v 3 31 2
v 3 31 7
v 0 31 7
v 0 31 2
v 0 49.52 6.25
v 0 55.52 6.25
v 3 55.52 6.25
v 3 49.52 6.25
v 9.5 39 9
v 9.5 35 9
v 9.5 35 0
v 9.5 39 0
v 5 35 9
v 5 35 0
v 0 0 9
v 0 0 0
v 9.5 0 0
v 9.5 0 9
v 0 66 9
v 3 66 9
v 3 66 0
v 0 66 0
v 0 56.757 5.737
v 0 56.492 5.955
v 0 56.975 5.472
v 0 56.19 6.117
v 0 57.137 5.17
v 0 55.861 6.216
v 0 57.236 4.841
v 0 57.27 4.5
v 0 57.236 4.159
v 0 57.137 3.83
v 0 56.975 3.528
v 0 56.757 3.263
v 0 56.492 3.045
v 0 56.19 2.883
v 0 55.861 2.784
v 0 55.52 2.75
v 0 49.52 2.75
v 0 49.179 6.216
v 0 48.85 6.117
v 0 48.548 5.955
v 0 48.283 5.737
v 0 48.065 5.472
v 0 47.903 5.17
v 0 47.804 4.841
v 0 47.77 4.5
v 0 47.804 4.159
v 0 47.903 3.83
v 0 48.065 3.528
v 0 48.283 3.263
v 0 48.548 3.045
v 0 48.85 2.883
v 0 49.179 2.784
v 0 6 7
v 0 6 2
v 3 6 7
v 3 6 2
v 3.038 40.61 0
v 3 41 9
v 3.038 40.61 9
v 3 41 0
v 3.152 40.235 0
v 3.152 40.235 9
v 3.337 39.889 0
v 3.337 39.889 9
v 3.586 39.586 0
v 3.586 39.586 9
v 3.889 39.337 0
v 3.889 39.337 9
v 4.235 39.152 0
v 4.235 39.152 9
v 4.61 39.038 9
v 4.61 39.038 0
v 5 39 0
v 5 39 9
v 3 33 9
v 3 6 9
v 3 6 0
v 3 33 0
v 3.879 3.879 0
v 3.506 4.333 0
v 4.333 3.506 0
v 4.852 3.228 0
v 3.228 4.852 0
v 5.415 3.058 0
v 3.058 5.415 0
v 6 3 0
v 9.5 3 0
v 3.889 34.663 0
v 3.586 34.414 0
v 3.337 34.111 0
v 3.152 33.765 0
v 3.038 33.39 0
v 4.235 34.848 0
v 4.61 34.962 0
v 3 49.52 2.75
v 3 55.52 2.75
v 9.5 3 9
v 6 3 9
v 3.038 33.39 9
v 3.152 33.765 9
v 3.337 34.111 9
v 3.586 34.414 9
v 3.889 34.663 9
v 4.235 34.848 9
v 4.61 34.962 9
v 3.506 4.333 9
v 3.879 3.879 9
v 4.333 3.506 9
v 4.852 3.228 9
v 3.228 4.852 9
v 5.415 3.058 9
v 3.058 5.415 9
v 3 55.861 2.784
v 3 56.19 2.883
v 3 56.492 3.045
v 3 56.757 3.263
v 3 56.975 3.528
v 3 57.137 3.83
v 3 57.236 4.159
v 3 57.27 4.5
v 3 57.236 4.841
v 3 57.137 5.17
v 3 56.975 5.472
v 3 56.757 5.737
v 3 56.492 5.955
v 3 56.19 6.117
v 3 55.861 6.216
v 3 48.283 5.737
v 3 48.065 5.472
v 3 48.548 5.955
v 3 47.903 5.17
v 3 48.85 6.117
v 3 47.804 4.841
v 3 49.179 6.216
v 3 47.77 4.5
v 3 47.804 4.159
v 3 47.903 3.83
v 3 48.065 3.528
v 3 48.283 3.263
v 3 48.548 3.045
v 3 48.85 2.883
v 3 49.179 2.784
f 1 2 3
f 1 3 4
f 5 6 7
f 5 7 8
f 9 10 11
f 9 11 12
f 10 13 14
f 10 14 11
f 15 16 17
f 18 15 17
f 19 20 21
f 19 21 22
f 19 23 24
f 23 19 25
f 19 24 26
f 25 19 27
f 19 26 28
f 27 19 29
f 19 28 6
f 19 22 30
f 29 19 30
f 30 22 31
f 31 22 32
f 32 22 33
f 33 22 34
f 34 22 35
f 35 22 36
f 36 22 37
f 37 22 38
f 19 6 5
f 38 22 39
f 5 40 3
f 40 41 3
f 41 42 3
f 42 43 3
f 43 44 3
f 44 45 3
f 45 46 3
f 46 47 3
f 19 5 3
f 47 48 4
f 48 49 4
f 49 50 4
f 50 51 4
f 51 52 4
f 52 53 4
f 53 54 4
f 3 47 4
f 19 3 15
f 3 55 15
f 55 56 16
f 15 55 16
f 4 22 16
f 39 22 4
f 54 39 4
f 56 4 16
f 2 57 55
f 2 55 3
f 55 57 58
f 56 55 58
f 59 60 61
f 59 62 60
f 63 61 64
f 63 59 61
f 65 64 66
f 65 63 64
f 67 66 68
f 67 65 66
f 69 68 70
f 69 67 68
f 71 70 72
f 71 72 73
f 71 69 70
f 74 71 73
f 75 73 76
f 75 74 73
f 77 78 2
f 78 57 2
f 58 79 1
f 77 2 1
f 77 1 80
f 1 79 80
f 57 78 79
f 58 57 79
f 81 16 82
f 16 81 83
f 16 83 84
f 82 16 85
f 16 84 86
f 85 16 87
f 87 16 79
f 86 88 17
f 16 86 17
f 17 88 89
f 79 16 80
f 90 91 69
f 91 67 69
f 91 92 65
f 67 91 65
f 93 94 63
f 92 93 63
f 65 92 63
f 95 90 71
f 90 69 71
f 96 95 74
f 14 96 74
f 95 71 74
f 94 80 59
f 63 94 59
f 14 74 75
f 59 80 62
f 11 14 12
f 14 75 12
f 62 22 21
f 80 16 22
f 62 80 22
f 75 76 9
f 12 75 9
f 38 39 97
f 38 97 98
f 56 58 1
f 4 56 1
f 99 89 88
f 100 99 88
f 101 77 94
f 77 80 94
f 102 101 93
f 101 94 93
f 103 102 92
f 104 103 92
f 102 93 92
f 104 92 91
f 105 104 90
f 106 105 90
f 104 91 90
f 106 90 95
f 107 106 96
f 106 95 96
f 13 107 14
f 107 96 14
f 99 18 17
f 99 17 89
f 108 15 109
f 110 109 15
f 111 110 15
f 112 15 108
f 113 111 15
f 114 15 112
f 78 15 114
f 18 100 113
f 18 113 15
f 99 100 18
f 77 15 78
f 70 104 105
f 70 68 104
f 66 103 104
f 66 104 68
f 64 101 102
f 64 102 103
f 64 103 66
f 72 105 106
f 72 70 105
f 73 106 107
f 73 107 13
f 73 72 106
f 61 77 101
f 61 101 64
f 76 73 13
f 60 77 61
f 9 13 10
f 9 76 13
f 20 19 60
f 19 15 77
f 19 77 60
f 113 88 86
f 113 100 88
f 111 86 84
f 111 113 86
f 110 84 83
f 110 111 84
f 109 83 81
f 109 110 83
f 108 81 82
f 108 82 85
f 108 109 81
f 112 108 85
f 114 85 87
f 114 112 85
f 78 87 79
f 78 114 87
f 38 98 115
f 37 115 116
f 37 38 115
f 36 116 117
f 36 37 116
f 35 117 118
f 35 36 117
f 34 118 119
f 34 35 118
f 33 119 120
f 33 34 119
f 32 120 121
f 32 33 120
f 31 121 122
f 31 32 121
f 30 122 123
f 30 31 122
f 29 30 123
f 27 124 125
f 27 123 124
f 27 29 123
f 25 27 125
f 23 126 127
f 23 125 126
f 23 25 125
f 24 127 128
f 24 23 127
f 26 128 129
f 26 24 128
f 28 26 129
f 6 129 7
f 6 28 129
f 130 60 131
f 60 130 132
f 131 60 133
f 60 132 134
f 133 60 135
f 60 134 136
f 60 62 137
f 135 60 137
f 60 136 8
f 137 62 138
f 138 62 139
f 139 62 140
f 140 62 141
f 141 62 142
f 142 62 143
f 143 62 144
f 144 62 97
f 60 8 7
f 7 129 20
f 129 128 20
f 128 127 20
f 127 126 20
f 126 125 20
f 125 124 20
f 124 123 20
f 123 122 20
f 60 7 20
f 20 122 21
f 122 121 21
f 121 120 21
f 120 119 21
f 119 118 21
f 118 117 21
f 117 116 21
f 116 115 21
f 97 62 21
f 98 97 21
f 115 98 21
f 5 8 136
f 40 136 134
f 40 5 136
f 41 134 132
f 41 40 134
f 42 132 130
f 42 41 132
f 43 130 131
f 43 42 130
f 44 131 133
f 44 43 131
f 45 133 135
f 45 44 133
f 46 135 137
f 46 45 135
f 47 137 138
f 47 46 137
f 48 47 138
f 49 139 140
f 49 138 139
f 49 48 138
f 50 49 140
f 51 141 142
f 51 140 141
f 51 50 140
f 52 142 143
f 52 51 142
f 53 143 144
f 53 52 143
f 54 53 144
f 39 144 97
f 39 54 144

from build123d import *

# Parameters (mm, degrees)
EXTRUDE_1_DEPTH     = 9
CUT_EXTRUDE_2_DEPTH = 68.284842275
SKETCH_6_W          = 5
SKETCH_6_H          = 25
CUT_EXTRUDE_3_DEPTH = 67.927199254
FILLET_1_R          = 3
SKETCH_7_W          = 6.5
SKETCH_7_H          = 4
EXTRUDE_2_DEPTH     = 9
FILLET_2_R          = 2


with BuildPart() as part:
    # Эскиз1 → Бобышка-Вытянуть1 (new body)
    with BuildSketch(Plane.XY):
        Polygon((0, 0), (9.5, 0), (9.5, 3), (3, 3), (3, 66), (0, 66), align=None)
    extrude(amount=EXTRUDE_1_DEPTH)

    # Эскиз4 → Вырез-Вытянуть2 (cut, through all)
    with BuildSketch(Plane.ZY):
        with BuildLine():
            Line((6.25, 55.52), (6.25, 49.52))
            ThreePointArc((6.25, 49.52), (4.5, 47.77), (2.75, 49.52))
            Line((2.75, 49.52), (2.75, 55.52))
            ThreePointArc((2.75, 55.52), (4.5, 57.27), (6.25, 55.52))
        make_face()
    extrude(amount=-CUT_EXTRUDE_2_DEPTH, mode=Mode.SUBTRACT)

    # Эскиз6 → Вырез-Вытянуть3 (cut, through all)
    with BuildSketch(Plane(origin=(3, 0, 0), x_dir=(0, 0, -1), z_dir=(1, 0, 0))):
        with Locations((-4.5, 18.5)):
            Rectangle(SKETCH_6_W, SKETCH_6_H)
    extrude(amount=-CUT_EXTRUDE_3_DEPTH, mode=Mode.SUBTRACT)

    # Скругление1
    fillet_1_edges = [part.edges().sort_by_distance(p)[0] for p in [
        (3, 3, 4.5),
    ]]
    fillet(fillet_1_edges, radius=FILLET_1_R - 0.0001)  # a hair under: the kernel refuses the full size

    # Эскиз7 → Бобышка-Вытянуть2 (add)
    with BuildSketch(Plane.XY.offset(9)):
        with Locations((6.25, 37)):
            Rectangle(SKETCH_7_W, SKETCH_7_H)
    extrude(amount=-EXTRUDE_2_DEPTH)

    # Скругление2
    fillet_2_edges = [part.edges().sort_by_distance(p)[0] for p in [
        (3, 39, 4.5),
        (3, 35, 4.5),
    ]]
    fillet(fillet_2_edges, radius=FILLET_2_R)


solid = part.part
